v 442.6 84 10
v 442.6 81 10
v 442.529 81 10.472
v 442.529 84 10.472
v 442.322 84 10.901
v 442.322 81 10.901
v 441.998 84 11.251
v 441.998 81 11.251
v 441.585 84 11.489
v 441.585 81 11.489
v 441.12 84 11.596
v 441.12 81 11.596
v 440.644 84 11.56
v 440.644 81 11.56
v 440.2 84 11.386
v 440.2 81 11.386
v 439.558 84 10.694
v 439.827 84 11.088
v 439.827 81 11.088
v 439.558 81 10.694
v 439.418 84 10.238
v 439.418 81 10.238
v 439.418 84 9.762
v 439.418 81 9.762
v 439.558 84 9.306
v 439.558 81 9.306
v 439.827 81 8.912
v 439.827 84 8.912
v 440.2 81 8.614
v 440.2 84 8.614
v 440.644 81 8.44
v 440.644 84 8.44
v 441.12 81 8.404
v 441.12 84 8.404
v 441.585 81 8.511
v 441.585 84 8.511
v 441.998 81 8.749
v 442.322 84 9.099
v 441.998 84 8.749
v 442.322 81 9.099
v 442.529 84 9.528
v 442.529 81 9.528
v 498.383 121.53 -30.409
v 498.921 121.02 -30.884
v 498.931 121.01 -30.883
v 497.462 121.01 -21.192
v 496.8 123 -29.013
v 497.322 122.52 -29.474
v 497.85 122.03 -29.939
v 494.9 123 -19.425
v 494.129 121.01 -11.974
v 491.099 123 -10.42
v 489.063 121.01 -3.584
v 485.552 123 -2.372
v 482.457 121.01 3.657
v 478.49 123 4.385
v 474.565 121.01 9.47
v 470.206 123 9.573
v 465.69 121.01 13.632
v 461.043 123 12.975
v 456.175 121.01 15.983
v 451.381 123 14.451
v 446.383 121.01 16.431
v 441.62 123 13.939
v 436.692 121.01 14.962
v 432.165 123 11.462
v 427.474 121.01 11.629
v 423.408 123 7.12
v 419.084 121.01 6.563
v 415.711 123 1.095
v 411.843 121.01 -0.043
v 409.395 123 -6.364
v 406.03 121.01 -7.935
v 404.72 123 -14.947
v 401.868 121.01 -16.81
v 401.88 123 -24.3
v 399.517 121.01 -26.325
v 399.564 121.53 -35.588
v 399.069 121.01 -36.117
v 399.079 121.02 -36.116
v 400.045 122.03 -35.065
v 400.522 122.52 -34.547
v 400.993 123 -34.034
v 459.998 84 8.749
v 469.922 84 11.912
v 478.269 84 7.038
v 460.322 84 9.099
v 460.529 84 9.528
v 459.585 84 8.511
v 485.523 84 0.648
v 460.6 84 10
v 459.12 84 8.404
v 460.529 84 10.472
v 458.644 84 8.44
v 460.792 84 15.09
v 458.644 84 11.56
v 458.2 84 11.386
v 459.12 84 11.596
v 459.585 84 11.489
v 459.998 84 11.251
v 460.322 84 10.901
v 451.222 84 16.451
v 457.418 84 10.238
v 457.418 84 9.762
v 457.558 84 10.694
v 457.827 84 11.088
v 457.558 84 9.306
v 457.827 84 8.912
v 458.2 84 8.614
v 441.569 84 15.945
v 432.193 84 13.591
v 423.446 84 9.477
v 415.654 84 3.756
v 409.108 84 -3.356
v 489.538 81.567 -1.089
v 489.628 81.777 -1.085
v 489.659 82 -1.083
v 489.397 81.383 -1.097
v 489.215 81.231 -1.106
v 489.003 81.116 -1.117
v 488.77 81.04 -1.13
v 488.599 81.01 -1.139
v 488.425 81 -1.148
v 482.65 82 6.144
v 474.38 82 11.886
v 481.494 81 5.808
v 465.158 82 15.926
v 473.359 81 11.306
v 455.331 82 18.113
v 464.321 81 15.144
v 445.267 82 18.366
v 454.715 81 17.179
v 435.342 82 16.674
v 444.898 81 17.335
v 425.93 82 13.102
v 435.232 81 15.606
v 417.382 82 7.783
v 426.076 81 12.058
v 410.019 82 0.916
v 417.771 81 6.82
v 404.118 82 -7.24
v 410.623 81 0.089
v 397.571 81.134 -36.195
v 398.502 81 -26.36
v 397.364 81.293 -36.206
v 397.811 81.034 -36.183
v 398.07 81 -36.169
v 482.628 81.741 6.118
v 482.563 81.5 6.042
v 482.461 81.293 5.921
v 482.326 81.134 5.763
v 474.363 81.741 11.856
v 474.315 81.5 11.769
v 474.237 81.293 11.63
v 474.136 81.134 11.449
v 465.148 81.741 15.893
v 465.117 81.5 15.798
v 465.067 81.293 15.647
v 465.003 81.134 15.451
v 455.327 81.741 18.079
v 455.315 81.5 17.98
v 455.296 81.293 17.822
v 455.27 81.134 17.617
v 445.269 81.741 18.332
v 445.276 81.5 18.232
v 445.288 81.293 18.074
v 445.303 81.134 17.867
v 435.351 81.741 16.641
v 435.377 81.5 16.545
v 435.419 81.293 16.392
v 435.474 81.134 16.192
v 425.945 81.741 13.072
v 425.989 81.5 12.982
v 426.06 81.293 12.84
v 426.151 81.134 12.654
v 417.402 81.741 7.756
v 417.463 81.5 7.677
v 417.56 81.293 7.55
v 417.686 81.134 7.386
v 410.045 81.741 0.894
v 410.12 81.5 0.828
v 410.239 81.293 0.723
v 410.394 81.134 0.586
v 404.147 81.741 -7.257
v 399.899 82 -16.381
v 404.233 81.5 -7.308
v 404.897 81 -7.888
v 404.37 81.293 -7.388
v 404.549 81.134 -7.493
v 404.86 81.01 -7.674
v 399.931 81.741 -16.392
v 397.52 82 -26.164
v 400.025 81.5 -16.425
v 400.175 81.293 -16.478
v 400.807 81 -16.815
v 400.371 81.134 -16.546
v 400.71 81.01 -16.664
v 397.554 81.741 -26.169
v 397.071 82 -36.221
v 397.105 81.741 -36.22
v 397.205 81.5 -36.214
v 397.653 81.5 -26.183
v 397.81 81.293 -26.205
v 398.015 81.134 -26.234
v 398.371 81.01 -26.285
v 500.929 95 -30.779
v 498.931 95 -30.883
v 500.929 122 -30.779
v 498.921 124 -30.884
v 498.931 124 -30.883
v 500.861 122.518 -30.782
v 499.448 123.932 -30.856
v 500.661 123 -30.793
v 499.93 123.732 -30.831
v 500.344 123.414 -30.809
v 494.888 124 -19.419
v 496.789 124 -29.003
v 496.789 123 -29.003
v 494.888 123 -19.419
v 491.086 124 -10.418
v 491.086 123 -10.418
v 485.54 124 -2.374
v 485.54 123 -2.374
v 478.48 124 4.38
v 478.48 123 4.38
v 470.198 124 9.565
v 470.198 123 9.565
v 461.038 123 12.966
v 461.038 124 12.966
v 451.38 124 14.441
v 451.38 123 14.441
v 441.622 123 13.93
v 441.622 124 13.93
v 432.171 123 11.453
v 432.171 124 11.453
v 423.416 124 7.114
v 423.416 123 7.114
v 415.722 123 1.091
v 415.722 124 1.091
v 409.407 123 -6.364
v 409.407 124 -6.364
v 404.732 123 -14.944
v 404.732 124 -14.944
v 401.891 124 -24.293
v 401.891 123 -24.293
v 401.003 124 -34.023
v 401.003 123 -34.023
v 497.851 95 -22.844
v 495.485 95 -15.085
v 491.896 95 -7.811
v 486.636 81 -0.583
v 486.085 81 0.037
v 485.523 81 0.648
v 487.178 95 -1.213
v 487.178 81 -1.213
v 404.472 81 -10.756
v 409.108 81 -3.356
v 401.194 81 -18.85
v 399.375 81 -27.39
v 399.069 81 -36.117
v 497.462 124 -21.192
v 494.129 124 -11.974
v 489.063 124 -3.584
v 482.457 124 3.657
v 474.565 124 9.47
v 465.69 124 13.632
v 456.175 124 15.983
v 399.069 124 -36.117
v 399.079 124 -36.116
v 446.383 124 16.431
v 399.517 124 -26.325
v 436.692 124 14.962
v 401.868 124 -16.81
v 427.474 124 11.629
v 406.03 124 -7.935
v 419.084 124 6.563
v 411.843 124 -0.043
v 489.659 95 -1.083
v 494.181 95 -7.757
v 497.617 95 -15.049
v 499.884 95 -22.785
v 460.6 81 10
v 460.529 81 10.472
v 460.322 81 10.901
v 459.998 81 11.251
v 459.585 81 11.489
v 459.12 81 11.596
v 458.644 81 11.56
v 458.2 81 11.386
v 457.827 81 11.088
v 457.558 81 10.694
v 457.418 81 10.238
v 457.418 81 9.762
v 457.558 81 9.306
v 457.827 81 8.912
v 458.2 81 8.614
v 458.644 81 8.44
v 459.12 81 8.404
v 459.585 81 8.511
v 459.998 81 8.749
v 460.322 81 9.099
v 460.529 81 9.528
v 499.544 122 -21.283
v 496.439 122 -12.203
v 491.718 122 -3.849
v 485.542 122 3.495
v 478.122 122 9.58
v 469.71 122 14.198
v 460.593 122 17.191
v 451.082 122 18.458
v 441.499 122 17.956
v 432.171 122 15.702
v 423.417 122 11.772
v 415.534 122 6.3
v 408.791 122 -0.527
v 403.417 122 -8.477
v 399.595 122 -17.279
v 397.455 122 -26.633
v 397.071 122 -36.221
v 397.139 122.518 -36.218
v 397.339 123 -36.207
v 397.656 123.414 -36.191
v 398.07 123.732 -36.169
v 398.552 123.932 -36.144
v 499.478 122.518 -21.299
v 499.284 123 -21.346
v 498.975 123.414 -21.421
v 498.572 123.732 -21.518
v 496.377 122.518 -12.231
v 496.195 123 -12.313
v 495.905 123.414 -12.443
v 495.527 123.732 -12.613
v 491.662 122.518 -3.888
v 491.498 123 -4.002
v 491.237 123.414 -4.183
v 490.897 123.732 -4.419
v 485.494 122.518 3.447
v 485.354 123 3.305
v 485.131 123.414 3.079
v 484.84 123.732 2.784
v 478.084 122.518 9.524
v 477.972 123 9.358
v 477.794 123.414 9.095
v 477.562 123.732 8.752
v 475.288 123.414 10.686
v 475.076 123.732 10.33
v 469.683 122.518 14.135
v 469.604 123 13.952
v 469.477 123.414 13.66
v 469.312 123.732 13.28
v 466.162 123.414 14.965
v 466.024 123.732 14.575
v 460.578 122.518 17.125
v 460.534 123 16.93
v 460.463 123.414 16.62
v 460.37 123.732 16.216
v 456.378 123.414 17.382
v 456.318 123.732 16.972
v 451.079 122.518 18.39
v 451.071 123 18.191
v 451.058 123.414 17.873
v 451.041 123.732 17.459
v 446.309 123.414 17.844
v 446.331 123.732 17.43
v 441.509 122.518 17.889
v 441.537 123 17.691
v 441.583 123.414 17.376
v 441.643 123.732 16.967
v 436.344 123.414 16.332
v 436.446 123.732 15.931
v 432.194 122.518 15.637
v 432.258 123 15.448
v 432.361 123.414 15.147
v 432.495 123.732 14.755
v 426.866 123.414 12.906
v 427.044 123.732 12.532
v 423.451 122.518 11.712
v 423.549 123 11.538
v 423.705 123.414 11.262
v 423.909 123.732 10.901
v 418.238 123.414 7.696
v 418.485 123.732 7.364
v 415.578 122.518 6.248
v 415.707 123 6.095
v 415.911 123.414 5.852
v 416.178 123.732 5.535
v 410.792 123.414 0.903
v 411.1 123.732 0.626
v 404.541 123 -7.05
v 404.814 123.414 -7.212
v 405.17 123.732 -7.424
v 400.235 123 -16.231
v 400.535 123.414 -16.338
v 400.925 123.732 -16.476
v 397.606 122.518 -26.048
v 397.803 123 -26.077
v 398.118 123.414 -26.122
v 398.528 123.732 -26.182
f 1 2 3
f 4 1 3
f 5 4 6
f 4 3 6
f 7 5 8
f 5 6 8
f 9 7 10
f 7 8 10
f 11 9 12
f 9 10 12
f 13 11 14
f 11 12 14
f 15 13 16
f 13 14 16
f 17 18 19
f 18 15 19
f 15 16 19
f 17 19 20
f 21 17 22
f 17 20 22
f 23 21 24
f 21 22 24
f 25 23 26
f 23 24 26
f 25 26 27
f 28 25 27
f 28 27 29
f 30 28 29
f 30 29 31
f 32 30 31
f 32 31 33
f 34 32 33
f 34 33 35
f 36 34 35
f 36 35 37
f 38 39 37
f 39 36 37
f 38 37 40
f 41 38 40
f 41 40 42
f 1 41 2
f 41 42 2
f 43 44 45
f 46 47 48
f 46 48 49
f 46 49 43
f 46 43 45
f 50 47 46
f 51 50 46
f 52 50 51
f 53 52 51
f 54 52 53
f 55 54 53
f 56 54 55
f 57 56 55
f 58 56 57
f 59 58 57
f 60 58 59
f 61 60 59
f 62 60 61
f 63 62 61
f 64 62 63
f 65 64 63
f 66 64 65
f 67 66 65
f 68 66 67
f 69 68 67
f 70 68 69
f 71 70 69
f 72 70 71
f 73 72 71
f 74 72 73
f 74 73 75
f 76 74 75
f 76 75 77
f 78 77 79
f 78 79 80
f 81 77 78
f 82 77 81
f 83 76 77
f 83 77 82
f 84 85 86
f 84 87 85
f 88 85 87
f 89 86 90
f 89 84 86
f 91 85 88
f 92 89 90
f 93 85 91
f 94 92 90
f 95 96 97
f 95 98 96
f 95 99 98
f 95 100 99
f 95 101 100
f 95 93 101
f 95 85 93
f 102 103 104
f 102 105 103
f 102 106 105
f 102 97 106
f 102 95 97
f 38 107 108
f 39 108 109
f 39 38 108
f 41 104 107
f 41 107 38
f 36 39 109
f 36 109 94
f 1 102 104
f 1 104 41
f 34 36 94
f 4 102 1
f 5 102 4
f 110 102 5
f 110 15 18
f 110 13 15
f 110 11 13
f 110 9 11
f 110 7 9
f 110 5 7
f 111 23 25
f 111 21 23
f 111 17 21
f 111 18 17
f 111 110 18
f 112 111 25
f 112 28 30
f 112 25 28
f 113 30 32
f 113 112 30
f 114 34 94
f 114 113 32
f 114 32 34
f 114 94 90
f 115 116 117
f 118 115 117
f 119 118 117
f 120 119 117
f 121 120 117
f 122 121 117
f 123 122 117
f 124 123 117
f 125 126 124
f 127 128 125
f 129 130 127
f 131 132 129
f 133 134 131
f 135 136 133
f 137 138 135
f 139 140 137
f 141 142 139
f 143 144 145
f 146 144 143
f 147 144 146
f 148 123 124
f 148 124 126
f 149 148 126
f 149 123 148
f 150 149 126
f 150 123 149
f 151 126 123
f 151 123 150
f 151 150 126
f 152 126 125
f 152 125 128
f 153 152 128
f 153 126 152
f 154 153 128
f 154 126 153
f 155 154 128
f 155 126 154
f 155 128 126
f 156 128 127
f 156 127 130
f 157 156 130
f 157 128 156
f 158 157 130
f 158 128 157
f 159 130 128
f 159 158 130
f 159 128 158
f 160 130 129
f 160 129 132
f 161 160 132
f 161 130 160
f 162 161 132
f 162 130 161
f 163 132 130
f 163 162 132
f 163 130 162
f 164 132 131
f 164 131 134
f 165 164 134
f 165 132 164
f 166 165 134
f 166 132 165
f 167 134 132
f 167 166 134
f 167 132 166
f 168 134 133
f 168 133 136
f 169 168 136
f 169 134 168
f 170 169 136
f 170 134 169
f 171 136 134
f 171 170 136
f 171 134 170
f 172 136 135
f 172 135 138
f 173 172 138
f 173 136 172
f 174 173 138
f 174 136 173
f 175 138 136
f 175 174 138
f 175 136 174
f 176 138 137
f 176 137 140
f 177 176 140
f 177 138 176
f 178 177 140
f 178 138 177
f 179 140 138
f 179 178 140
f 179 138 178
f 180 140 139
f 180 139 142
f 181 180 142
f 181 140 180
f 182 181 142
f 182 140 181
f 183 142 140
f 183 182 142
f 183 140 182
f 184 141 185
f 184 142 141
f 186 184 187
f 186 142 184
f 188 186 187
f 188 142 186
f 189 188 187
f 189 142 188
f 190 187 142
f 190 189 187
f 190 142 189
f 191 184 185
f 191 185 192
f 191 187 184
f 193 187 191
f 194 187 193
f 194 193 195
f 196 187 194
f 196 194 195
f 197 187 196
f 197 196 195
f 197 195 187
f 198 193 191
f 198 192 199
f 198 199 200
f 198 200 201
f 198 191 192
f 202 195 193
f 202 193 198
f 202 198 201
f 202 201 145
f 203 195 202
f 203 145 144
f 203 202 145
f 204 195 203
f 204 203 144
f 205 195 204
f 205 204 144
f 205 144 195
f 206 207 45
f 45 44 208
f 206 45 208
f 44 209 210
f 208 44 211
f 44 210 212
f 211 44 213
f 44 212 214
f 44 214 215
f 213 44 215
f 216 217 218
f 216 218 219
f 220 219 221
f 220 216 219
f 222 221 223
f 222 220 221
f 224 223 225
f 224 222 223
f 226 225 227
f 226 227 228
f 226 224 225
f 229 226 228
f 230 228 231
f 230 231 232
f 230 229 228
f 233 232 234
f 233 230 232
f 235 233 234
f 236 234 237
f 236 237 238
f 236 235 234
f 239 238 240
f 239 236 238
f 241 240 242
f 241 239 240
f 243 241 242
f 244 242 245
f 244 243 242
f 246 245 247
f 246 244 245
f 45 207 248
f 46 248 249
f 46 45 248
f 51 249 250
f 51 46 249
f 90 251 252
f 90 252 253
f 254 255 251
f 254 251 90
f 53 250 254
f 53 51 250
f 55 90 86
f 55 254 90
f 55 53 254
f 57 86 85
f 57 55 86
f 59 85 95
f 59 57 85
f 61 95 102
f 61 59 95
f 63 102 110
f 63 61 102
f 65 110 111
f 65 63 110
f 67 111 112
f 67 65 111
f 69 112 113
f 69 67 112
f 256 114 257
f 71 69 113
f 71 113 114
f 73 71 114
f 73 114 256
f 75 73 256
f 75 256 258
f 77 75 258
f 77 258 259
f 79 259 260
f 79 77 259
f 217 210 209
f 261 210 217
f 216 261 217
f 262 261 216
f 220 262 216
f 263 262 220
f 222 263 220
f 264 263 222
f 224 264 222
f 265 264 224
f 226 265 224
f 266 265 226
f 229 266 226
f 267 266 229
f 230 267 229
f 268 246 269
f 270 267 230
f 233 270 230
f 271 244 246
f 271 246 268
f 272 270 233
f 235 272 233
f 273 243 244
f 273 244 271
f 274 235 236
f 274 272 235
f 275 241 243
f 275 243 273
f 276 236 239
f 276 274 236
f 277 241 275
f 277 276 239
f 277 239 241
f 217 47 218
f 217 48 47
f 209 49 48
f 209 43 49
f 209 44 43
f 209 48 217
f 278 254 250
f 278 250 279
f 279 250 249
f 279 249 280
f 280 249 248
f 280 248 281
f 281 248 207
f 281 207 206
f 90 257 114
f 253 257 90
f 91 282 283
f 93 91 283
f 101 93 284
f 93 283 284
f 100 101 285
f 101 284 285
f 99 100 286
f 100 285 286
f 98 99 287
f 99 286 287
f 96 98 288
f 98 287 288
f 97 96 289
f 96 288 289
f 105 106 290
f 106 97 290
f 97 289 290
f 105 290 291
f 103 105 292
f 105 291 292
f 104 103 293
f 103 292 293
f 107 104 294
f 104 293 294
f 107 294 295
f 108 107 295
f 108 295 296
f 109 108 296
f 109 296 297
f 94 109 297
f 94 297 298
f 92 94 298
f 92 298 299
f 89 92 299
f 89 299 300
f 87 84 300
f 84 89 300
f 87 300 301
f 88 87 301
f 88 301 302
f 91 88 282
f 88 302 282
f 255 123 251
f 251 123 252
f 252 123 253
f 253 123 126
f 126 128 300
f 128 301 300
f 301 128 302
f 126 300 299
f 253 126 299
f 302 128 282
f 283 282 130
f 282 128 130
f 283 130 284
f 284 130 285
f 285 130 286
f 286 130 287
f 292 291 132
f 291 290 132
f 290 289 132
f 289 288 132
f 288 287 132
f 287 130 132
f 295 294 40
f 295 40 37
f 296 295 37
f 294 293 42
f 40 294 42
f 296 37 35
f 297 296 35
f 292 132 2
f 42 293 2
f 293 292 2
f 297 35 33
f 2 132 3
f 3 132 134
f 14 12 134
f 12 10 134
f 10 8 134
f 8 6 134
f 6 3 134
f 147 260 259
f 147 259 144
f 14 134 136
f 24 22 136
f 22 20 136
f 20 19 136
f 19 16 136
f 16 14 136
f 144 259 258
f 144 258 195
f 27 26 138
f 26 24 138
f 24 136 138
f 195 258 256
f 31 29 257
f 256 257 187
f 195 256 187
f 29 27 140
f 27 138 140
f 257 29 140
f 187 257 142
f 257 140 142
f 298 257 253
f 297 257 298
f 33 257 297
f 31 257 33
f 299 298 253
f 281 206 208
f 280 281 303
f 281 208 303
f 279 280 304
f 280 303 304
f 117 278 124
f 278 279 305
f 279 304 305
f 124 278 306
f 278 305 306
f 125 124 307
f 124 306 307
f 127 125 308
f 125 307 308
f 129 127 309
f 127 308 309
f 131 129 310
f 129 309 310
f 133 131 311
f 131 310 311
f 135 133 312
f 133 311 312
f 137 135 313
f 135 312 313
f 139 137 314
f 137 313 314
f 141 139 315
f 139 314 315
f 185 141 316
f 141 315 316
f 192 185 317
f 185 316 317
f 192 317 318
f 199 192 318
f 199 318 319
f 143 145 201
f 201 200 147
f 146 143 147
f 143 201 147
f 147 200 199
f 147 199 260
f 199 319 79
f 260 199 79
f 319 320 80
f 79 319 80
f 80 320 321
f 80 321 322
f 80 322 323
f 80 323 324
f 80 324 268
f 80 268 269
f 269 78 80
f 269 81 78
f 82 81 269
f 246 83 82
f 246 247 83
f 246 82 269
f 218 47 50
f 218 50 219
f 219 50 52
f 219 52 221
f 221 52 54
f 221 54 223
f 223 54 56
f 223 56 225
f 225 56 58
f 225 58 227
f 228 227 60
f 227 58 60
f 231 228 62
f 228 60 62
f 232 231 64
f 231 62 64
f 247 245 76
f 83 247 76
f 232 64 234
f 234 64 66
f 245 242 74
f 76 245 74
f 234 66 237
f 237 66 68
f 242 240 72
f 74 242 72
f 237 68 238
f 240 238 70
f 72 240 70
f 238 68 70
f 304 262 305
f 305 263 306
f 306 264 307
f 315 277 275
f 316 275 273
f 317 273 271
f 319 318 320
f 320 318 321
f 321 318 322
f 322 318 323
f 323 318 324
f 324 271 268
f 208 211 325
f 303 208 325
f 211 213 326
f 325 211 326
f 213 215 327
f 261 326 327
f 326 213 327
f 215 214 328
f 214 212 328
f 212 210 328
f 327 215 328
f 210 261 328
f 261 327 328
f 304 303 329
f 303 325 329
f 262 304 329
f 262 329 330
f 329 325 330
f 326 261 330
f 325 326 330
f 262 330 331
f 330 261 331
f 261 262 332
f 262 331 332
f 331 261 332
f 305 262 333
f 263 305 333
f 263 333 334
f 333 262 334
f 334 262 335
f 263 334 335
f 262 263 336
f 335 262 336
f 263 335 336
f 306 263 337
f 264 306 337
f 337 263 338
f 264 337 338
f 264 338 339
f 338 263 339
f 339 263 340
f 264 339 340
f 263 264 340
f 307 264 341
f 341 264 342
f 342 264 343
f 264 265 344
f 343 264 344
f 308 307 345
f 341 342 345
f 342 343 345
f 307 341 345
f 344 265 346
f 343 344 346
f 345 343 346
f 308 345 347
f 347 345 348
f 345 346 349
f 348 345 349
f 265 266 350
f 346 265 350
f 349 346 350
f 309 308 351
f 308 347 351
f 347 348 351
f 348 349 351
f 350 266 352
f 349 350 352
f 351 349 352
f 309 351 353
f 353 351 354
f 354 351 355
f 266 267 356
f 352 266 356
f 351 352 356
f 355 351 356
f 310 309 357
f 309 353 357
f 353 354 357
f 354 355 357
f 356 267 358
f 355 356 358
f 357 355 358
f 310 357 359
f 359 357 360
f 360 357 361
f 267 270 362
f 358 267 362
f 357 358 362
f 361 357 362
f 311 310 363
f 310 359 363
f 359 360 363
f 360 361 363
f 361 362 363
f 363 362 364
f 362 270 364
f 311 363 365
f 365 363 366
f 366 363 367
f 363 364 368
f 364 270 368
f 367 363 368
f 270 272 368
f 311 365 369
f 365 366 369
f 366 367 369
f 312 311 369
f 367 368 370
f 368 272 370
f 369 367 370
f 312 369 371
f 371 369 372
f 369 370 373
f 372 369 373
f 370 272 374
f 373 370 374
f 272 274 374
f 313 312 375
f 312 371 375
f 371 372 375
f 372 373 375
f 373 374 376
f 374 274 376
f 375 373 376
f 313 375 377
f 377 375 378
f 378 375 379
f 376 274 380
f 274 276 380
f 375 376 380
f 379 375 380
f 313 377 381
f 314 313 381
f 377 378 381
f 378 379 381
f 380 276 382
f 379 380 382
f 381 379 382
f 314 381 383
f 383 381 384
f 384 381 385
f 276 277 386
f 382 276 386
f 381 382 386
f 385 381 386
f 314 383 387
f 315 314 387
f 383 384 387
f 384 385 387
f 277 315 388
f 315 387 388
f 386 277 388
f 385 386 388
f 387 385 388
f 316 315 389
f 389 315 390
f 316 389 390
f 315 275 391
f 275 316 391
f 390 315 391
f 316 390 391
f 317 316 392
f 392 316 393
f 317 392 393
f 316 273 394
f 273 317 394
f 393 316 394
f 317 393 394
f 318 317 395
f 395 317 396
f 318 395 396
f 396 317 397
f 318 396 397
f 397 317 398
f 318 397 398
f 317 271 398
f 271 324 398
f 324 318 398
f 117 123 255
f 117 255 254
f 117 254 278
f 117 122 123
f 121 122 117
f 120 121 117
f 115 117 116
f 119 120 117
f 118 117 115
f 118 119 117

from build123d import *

# Parameters (mm, degrees)
BOX338_W                = 59
BOX338_H                = 20
BOX338_DEPTH            = 32
BOX338_PLACEMENT_ANGLE  = 3
CYLINDER483_R           = 1.6
CYLINDER483_DEPTH       = 9
CYLINDER481_R           = 1.6
CYLINDER481_DEPTH       = 9
BOX337_W                = 128
BOX337_H                = 3
BOX337_DEPTH            = 35
BOX337_PLACEMENT_ANGLE  = 3
CYLINDER489_W           = 52
CYLINDER489_H           = 3
CYLINDER489_ANGLE       = 180
CYLINDER489_ROLL_ANGLE  = 90
CYLINDER489_PITCH_ANGLE = -3
CYLINDER491_W           = 48
CYLINDER491_H           = 2
CYLINDER491_ANGLE       = 180
CYLINDER488_W           = 50
CYLINDER488_H           = 42
CYLINDER488_ANGLE       = 180
CYLINDER490_W           = 52
CYLINDER490_H           = 43
CYLINDER490_ANGLE       = 180
CUT342_PLACEMENT_ANGLE  = 3
FILLET124_R             = 2
FILLET125_R             = 1
CHAMFER049_SIZE         = 1.99
CHAMFER052_SIZE         = 1.99


with BuildPart() as cube409:
    # Box338 → Box338 (new body)
    with BuildSketch(Plane.XY):
        with Locations((29.5, 10)):
            Rectangle(BOX338_W, BOX338_H)
    extrude(amount=BOX338_DEPTH)


with BuildPart() as cube409_1:
    # Box338 placement: moved
    add(cube409.part.moved(Location((473, -33, -34))).rotate(Axis((473, -33, -34), (0, -1, 0)), BOX338_PLACEMENT_ANGLE))


with BuildPart() as cylinder584:
    # Cylinder483 → Cylinder483 (new body)
    with BuildSketch(Plane(origin=(441, -17, 10), x_dir=(1, 0, 0), z_dir=(0, -1, 0))):
        Circle(CYLINDER483_R)
    extrude(amount=CYLINDER483_DEPTH)


with BuildPart() as fusion433:
    # Cylinder481 → Cylinder481 (new body)
    with BuildSketch(Plane(origin=(459, -17, 10), x_dir=(1, 0, 0), z_dir=(0, -1, 0))):
        Circle(CYLINDER481_R)
    extrude(amount=CYLINDER481_DEPTH)

    # Fusion433: union Cylinder584
    add(cylinder584.part)


with BuildPart() as cube408:
    # Box337 → Box337 (new body)
    with BuildSketch(Plane.XY):
        with Locations((64, 1.5)):
            Rectangle(BOX337_W, BOX337_H)
    extrude(amount=BOX337_DEPTH)


with BuildPart() as cube408_1:
    # Box337 placement: moved
    add(cube408.part.moved(Location((382, -9, -40.8))).rotate(Axis((382, -9, -40.8), (0, -1, 0)), BOX337_PLACEMENT_ANGLE))


with BuildPart() as cut343:
    # Cylinder489 → Cylinder489 (revolve)
    with BuildSketch(Plane.XZ):
        with Locations((26, 1.5)):
            Rectangle(CYLINDER489_W, CYLINDER489_H)
    revolve(axis=Axis((0, 0, 0), (0, 0, 1)), revolution_arc=CYLINDER489_ANGLE)


with BuildPart() as cut343_1:
    # Cylinder489 roll: moved
    add(cut343.part.rotate(Axis((0, 0, 0), (1, 0, 0)), CYLINDER489_ROLL_ANGLE))


with BuildPart() as cut343_2:
    # Cylinder489 pitch: moved
    add(cut343_1.part.rotate(Axis((0, 0, 0), (0, 1, 0)), CYLINDER489_PITCH_ANGLE))


with BuildPart() as cut343_3:
    # Cylinder489 placement: moved
    add(cut343_2.part.moved(Location((448.581401, -6, -35.39126))))

    # Cut343: cut Cube408
    add(cube408_1.part, mode=Mode.SUBTRACT)


with BuildPart() as cut343_4:
    # Cut343 placement: moved
    add(cut343_3.part.moved(Location((105.48, -13, 6.5))))


with BuildPart() as cylinder588:
    # Cylinder491 → Cylinder491 (revolve)
    with BuildSketch(Plane(origin=(554, -60, -28), x_dir=(1, 0, 0), z_dir=(0, 0, -1))):
        with Locations((24, 1)):
            Rectangle(CYLINDER491_W, CYLINDER491_H)
    revolve(axis=Axis((554, -60, -28), (0, -1, 0)), revolution_arc=CYLINDER491_ANGLE)


with BuildPart() as fusion438:
    # Cylinder488 → Cylinder488 (revolve)
    with BuildSketch(Plane(origin=(554, -19, -28), x_dir=(1, 0, 0), z_dir=(0, 0, -1))):
        with Locations((25, 21)):
            Rectangle(CYLINDER488_W, CYLINDER488_H)
    revolve(axis=Axis((554, -19, -28), (0, -1, 0)), revolution_arc=CYLINDER488_ANGLE)

    # Fusion438: union Cylinder588
    add(cylinder588.part)


with BuildPart() as fender_front_left:
    # Cylinder490 → Cylinder490 (revolve)
    with BuildSketch(Plane(origin=(554, -19, -28), x_dir=(1, 0, 0), z_dir=(0, 0, -1))):
        with Locations((26, 21.5)):
            Rectangle(CYLINDER490_W, CYLINDER490_H)
    revolve(axis=Axis((554, -19, -28), (0, -1, 0)), revolution_arc=CYLINDER490_ANGLE)

    # Cut342: cut Fusion438
    add(fusion438.part, mode=Mode.SUBTRACT)


with BuildPart() as fender_front_left_1:
    # Cut342 placement: moved
    add(fender_front_left.part.moved(Location((-0.706169, 0, -29.032493))).rotate(Axis((-0.706169, 0, -29.032493), (0, -1, 0)), CUT342_PLACEMENT_ANGLE))

    # Fusion437: union Cut343
    add(cut343_4.part)


with BuildPart() as fender_front_left_2:
    # Fusion437 placement: moved
    add(fender_front_left_1.part.moved(Location((-105, 0, -5.5))))

    # Cut345: cut Fusion433
    add(fusion433.part, mode=Mode.SUBTRACT)

    # Cut347: cut Cube409
    add(cube409_1.part, mode=Mode.SUBTRACT)

    # Fillet124
    fillet124_edges = [fender_front_left_2.edges().sort_by_distance(p)[0] for p in [
        (446.27853, -62, 18.428736),
    ]]
    fillet(fillet124_edges, radius=FILLET124_R)

    # Fillet125
    fillet125_edges = [fender_front_left_2.edges().sort_by_distance(p)[0] for p in [
        (430.549251, -19, 15.116559),
    ]]
    fillet(fillet125_edges, radius=FILLET125_R)

    # Chamfer049
    chamfer049_edges = [fender_front_left_2.edges().sort_by_distance(p)[0] for p in [
        (446.383202, -61, 16.431477),
    ]]
    chamfer(chamfer049_edges, length=CHAMFER049_SIZE)

    # Chamfer052
    chamfer052_edges = [fender_front_left_2.edges().sort_by_distance(p)[0] for p in [
        (401.065782, -61.5, -36.012126),
        (496.934218, -61.5, -30.987874),
    ]]
    chamfer(chamfer052_edges, length=CHAMFER052_SIZE)


with BuildPart() as fender_front_right:
    # Part__Mirroring011: instance of fender-front-left_
    add(fender_front_left_2.part.mirror(Plane(origin=(0, 0, 0), x_dir=(1, 0, 0), z_dir=(0, 1, 0))))


with BuildPart() as fender_front_right_1:
    # Part__Mirroring011 placement: moved
    add(fender_front_right.part.moved(Location((0, 62, 0))))


solid = fender_front_right_1.part
